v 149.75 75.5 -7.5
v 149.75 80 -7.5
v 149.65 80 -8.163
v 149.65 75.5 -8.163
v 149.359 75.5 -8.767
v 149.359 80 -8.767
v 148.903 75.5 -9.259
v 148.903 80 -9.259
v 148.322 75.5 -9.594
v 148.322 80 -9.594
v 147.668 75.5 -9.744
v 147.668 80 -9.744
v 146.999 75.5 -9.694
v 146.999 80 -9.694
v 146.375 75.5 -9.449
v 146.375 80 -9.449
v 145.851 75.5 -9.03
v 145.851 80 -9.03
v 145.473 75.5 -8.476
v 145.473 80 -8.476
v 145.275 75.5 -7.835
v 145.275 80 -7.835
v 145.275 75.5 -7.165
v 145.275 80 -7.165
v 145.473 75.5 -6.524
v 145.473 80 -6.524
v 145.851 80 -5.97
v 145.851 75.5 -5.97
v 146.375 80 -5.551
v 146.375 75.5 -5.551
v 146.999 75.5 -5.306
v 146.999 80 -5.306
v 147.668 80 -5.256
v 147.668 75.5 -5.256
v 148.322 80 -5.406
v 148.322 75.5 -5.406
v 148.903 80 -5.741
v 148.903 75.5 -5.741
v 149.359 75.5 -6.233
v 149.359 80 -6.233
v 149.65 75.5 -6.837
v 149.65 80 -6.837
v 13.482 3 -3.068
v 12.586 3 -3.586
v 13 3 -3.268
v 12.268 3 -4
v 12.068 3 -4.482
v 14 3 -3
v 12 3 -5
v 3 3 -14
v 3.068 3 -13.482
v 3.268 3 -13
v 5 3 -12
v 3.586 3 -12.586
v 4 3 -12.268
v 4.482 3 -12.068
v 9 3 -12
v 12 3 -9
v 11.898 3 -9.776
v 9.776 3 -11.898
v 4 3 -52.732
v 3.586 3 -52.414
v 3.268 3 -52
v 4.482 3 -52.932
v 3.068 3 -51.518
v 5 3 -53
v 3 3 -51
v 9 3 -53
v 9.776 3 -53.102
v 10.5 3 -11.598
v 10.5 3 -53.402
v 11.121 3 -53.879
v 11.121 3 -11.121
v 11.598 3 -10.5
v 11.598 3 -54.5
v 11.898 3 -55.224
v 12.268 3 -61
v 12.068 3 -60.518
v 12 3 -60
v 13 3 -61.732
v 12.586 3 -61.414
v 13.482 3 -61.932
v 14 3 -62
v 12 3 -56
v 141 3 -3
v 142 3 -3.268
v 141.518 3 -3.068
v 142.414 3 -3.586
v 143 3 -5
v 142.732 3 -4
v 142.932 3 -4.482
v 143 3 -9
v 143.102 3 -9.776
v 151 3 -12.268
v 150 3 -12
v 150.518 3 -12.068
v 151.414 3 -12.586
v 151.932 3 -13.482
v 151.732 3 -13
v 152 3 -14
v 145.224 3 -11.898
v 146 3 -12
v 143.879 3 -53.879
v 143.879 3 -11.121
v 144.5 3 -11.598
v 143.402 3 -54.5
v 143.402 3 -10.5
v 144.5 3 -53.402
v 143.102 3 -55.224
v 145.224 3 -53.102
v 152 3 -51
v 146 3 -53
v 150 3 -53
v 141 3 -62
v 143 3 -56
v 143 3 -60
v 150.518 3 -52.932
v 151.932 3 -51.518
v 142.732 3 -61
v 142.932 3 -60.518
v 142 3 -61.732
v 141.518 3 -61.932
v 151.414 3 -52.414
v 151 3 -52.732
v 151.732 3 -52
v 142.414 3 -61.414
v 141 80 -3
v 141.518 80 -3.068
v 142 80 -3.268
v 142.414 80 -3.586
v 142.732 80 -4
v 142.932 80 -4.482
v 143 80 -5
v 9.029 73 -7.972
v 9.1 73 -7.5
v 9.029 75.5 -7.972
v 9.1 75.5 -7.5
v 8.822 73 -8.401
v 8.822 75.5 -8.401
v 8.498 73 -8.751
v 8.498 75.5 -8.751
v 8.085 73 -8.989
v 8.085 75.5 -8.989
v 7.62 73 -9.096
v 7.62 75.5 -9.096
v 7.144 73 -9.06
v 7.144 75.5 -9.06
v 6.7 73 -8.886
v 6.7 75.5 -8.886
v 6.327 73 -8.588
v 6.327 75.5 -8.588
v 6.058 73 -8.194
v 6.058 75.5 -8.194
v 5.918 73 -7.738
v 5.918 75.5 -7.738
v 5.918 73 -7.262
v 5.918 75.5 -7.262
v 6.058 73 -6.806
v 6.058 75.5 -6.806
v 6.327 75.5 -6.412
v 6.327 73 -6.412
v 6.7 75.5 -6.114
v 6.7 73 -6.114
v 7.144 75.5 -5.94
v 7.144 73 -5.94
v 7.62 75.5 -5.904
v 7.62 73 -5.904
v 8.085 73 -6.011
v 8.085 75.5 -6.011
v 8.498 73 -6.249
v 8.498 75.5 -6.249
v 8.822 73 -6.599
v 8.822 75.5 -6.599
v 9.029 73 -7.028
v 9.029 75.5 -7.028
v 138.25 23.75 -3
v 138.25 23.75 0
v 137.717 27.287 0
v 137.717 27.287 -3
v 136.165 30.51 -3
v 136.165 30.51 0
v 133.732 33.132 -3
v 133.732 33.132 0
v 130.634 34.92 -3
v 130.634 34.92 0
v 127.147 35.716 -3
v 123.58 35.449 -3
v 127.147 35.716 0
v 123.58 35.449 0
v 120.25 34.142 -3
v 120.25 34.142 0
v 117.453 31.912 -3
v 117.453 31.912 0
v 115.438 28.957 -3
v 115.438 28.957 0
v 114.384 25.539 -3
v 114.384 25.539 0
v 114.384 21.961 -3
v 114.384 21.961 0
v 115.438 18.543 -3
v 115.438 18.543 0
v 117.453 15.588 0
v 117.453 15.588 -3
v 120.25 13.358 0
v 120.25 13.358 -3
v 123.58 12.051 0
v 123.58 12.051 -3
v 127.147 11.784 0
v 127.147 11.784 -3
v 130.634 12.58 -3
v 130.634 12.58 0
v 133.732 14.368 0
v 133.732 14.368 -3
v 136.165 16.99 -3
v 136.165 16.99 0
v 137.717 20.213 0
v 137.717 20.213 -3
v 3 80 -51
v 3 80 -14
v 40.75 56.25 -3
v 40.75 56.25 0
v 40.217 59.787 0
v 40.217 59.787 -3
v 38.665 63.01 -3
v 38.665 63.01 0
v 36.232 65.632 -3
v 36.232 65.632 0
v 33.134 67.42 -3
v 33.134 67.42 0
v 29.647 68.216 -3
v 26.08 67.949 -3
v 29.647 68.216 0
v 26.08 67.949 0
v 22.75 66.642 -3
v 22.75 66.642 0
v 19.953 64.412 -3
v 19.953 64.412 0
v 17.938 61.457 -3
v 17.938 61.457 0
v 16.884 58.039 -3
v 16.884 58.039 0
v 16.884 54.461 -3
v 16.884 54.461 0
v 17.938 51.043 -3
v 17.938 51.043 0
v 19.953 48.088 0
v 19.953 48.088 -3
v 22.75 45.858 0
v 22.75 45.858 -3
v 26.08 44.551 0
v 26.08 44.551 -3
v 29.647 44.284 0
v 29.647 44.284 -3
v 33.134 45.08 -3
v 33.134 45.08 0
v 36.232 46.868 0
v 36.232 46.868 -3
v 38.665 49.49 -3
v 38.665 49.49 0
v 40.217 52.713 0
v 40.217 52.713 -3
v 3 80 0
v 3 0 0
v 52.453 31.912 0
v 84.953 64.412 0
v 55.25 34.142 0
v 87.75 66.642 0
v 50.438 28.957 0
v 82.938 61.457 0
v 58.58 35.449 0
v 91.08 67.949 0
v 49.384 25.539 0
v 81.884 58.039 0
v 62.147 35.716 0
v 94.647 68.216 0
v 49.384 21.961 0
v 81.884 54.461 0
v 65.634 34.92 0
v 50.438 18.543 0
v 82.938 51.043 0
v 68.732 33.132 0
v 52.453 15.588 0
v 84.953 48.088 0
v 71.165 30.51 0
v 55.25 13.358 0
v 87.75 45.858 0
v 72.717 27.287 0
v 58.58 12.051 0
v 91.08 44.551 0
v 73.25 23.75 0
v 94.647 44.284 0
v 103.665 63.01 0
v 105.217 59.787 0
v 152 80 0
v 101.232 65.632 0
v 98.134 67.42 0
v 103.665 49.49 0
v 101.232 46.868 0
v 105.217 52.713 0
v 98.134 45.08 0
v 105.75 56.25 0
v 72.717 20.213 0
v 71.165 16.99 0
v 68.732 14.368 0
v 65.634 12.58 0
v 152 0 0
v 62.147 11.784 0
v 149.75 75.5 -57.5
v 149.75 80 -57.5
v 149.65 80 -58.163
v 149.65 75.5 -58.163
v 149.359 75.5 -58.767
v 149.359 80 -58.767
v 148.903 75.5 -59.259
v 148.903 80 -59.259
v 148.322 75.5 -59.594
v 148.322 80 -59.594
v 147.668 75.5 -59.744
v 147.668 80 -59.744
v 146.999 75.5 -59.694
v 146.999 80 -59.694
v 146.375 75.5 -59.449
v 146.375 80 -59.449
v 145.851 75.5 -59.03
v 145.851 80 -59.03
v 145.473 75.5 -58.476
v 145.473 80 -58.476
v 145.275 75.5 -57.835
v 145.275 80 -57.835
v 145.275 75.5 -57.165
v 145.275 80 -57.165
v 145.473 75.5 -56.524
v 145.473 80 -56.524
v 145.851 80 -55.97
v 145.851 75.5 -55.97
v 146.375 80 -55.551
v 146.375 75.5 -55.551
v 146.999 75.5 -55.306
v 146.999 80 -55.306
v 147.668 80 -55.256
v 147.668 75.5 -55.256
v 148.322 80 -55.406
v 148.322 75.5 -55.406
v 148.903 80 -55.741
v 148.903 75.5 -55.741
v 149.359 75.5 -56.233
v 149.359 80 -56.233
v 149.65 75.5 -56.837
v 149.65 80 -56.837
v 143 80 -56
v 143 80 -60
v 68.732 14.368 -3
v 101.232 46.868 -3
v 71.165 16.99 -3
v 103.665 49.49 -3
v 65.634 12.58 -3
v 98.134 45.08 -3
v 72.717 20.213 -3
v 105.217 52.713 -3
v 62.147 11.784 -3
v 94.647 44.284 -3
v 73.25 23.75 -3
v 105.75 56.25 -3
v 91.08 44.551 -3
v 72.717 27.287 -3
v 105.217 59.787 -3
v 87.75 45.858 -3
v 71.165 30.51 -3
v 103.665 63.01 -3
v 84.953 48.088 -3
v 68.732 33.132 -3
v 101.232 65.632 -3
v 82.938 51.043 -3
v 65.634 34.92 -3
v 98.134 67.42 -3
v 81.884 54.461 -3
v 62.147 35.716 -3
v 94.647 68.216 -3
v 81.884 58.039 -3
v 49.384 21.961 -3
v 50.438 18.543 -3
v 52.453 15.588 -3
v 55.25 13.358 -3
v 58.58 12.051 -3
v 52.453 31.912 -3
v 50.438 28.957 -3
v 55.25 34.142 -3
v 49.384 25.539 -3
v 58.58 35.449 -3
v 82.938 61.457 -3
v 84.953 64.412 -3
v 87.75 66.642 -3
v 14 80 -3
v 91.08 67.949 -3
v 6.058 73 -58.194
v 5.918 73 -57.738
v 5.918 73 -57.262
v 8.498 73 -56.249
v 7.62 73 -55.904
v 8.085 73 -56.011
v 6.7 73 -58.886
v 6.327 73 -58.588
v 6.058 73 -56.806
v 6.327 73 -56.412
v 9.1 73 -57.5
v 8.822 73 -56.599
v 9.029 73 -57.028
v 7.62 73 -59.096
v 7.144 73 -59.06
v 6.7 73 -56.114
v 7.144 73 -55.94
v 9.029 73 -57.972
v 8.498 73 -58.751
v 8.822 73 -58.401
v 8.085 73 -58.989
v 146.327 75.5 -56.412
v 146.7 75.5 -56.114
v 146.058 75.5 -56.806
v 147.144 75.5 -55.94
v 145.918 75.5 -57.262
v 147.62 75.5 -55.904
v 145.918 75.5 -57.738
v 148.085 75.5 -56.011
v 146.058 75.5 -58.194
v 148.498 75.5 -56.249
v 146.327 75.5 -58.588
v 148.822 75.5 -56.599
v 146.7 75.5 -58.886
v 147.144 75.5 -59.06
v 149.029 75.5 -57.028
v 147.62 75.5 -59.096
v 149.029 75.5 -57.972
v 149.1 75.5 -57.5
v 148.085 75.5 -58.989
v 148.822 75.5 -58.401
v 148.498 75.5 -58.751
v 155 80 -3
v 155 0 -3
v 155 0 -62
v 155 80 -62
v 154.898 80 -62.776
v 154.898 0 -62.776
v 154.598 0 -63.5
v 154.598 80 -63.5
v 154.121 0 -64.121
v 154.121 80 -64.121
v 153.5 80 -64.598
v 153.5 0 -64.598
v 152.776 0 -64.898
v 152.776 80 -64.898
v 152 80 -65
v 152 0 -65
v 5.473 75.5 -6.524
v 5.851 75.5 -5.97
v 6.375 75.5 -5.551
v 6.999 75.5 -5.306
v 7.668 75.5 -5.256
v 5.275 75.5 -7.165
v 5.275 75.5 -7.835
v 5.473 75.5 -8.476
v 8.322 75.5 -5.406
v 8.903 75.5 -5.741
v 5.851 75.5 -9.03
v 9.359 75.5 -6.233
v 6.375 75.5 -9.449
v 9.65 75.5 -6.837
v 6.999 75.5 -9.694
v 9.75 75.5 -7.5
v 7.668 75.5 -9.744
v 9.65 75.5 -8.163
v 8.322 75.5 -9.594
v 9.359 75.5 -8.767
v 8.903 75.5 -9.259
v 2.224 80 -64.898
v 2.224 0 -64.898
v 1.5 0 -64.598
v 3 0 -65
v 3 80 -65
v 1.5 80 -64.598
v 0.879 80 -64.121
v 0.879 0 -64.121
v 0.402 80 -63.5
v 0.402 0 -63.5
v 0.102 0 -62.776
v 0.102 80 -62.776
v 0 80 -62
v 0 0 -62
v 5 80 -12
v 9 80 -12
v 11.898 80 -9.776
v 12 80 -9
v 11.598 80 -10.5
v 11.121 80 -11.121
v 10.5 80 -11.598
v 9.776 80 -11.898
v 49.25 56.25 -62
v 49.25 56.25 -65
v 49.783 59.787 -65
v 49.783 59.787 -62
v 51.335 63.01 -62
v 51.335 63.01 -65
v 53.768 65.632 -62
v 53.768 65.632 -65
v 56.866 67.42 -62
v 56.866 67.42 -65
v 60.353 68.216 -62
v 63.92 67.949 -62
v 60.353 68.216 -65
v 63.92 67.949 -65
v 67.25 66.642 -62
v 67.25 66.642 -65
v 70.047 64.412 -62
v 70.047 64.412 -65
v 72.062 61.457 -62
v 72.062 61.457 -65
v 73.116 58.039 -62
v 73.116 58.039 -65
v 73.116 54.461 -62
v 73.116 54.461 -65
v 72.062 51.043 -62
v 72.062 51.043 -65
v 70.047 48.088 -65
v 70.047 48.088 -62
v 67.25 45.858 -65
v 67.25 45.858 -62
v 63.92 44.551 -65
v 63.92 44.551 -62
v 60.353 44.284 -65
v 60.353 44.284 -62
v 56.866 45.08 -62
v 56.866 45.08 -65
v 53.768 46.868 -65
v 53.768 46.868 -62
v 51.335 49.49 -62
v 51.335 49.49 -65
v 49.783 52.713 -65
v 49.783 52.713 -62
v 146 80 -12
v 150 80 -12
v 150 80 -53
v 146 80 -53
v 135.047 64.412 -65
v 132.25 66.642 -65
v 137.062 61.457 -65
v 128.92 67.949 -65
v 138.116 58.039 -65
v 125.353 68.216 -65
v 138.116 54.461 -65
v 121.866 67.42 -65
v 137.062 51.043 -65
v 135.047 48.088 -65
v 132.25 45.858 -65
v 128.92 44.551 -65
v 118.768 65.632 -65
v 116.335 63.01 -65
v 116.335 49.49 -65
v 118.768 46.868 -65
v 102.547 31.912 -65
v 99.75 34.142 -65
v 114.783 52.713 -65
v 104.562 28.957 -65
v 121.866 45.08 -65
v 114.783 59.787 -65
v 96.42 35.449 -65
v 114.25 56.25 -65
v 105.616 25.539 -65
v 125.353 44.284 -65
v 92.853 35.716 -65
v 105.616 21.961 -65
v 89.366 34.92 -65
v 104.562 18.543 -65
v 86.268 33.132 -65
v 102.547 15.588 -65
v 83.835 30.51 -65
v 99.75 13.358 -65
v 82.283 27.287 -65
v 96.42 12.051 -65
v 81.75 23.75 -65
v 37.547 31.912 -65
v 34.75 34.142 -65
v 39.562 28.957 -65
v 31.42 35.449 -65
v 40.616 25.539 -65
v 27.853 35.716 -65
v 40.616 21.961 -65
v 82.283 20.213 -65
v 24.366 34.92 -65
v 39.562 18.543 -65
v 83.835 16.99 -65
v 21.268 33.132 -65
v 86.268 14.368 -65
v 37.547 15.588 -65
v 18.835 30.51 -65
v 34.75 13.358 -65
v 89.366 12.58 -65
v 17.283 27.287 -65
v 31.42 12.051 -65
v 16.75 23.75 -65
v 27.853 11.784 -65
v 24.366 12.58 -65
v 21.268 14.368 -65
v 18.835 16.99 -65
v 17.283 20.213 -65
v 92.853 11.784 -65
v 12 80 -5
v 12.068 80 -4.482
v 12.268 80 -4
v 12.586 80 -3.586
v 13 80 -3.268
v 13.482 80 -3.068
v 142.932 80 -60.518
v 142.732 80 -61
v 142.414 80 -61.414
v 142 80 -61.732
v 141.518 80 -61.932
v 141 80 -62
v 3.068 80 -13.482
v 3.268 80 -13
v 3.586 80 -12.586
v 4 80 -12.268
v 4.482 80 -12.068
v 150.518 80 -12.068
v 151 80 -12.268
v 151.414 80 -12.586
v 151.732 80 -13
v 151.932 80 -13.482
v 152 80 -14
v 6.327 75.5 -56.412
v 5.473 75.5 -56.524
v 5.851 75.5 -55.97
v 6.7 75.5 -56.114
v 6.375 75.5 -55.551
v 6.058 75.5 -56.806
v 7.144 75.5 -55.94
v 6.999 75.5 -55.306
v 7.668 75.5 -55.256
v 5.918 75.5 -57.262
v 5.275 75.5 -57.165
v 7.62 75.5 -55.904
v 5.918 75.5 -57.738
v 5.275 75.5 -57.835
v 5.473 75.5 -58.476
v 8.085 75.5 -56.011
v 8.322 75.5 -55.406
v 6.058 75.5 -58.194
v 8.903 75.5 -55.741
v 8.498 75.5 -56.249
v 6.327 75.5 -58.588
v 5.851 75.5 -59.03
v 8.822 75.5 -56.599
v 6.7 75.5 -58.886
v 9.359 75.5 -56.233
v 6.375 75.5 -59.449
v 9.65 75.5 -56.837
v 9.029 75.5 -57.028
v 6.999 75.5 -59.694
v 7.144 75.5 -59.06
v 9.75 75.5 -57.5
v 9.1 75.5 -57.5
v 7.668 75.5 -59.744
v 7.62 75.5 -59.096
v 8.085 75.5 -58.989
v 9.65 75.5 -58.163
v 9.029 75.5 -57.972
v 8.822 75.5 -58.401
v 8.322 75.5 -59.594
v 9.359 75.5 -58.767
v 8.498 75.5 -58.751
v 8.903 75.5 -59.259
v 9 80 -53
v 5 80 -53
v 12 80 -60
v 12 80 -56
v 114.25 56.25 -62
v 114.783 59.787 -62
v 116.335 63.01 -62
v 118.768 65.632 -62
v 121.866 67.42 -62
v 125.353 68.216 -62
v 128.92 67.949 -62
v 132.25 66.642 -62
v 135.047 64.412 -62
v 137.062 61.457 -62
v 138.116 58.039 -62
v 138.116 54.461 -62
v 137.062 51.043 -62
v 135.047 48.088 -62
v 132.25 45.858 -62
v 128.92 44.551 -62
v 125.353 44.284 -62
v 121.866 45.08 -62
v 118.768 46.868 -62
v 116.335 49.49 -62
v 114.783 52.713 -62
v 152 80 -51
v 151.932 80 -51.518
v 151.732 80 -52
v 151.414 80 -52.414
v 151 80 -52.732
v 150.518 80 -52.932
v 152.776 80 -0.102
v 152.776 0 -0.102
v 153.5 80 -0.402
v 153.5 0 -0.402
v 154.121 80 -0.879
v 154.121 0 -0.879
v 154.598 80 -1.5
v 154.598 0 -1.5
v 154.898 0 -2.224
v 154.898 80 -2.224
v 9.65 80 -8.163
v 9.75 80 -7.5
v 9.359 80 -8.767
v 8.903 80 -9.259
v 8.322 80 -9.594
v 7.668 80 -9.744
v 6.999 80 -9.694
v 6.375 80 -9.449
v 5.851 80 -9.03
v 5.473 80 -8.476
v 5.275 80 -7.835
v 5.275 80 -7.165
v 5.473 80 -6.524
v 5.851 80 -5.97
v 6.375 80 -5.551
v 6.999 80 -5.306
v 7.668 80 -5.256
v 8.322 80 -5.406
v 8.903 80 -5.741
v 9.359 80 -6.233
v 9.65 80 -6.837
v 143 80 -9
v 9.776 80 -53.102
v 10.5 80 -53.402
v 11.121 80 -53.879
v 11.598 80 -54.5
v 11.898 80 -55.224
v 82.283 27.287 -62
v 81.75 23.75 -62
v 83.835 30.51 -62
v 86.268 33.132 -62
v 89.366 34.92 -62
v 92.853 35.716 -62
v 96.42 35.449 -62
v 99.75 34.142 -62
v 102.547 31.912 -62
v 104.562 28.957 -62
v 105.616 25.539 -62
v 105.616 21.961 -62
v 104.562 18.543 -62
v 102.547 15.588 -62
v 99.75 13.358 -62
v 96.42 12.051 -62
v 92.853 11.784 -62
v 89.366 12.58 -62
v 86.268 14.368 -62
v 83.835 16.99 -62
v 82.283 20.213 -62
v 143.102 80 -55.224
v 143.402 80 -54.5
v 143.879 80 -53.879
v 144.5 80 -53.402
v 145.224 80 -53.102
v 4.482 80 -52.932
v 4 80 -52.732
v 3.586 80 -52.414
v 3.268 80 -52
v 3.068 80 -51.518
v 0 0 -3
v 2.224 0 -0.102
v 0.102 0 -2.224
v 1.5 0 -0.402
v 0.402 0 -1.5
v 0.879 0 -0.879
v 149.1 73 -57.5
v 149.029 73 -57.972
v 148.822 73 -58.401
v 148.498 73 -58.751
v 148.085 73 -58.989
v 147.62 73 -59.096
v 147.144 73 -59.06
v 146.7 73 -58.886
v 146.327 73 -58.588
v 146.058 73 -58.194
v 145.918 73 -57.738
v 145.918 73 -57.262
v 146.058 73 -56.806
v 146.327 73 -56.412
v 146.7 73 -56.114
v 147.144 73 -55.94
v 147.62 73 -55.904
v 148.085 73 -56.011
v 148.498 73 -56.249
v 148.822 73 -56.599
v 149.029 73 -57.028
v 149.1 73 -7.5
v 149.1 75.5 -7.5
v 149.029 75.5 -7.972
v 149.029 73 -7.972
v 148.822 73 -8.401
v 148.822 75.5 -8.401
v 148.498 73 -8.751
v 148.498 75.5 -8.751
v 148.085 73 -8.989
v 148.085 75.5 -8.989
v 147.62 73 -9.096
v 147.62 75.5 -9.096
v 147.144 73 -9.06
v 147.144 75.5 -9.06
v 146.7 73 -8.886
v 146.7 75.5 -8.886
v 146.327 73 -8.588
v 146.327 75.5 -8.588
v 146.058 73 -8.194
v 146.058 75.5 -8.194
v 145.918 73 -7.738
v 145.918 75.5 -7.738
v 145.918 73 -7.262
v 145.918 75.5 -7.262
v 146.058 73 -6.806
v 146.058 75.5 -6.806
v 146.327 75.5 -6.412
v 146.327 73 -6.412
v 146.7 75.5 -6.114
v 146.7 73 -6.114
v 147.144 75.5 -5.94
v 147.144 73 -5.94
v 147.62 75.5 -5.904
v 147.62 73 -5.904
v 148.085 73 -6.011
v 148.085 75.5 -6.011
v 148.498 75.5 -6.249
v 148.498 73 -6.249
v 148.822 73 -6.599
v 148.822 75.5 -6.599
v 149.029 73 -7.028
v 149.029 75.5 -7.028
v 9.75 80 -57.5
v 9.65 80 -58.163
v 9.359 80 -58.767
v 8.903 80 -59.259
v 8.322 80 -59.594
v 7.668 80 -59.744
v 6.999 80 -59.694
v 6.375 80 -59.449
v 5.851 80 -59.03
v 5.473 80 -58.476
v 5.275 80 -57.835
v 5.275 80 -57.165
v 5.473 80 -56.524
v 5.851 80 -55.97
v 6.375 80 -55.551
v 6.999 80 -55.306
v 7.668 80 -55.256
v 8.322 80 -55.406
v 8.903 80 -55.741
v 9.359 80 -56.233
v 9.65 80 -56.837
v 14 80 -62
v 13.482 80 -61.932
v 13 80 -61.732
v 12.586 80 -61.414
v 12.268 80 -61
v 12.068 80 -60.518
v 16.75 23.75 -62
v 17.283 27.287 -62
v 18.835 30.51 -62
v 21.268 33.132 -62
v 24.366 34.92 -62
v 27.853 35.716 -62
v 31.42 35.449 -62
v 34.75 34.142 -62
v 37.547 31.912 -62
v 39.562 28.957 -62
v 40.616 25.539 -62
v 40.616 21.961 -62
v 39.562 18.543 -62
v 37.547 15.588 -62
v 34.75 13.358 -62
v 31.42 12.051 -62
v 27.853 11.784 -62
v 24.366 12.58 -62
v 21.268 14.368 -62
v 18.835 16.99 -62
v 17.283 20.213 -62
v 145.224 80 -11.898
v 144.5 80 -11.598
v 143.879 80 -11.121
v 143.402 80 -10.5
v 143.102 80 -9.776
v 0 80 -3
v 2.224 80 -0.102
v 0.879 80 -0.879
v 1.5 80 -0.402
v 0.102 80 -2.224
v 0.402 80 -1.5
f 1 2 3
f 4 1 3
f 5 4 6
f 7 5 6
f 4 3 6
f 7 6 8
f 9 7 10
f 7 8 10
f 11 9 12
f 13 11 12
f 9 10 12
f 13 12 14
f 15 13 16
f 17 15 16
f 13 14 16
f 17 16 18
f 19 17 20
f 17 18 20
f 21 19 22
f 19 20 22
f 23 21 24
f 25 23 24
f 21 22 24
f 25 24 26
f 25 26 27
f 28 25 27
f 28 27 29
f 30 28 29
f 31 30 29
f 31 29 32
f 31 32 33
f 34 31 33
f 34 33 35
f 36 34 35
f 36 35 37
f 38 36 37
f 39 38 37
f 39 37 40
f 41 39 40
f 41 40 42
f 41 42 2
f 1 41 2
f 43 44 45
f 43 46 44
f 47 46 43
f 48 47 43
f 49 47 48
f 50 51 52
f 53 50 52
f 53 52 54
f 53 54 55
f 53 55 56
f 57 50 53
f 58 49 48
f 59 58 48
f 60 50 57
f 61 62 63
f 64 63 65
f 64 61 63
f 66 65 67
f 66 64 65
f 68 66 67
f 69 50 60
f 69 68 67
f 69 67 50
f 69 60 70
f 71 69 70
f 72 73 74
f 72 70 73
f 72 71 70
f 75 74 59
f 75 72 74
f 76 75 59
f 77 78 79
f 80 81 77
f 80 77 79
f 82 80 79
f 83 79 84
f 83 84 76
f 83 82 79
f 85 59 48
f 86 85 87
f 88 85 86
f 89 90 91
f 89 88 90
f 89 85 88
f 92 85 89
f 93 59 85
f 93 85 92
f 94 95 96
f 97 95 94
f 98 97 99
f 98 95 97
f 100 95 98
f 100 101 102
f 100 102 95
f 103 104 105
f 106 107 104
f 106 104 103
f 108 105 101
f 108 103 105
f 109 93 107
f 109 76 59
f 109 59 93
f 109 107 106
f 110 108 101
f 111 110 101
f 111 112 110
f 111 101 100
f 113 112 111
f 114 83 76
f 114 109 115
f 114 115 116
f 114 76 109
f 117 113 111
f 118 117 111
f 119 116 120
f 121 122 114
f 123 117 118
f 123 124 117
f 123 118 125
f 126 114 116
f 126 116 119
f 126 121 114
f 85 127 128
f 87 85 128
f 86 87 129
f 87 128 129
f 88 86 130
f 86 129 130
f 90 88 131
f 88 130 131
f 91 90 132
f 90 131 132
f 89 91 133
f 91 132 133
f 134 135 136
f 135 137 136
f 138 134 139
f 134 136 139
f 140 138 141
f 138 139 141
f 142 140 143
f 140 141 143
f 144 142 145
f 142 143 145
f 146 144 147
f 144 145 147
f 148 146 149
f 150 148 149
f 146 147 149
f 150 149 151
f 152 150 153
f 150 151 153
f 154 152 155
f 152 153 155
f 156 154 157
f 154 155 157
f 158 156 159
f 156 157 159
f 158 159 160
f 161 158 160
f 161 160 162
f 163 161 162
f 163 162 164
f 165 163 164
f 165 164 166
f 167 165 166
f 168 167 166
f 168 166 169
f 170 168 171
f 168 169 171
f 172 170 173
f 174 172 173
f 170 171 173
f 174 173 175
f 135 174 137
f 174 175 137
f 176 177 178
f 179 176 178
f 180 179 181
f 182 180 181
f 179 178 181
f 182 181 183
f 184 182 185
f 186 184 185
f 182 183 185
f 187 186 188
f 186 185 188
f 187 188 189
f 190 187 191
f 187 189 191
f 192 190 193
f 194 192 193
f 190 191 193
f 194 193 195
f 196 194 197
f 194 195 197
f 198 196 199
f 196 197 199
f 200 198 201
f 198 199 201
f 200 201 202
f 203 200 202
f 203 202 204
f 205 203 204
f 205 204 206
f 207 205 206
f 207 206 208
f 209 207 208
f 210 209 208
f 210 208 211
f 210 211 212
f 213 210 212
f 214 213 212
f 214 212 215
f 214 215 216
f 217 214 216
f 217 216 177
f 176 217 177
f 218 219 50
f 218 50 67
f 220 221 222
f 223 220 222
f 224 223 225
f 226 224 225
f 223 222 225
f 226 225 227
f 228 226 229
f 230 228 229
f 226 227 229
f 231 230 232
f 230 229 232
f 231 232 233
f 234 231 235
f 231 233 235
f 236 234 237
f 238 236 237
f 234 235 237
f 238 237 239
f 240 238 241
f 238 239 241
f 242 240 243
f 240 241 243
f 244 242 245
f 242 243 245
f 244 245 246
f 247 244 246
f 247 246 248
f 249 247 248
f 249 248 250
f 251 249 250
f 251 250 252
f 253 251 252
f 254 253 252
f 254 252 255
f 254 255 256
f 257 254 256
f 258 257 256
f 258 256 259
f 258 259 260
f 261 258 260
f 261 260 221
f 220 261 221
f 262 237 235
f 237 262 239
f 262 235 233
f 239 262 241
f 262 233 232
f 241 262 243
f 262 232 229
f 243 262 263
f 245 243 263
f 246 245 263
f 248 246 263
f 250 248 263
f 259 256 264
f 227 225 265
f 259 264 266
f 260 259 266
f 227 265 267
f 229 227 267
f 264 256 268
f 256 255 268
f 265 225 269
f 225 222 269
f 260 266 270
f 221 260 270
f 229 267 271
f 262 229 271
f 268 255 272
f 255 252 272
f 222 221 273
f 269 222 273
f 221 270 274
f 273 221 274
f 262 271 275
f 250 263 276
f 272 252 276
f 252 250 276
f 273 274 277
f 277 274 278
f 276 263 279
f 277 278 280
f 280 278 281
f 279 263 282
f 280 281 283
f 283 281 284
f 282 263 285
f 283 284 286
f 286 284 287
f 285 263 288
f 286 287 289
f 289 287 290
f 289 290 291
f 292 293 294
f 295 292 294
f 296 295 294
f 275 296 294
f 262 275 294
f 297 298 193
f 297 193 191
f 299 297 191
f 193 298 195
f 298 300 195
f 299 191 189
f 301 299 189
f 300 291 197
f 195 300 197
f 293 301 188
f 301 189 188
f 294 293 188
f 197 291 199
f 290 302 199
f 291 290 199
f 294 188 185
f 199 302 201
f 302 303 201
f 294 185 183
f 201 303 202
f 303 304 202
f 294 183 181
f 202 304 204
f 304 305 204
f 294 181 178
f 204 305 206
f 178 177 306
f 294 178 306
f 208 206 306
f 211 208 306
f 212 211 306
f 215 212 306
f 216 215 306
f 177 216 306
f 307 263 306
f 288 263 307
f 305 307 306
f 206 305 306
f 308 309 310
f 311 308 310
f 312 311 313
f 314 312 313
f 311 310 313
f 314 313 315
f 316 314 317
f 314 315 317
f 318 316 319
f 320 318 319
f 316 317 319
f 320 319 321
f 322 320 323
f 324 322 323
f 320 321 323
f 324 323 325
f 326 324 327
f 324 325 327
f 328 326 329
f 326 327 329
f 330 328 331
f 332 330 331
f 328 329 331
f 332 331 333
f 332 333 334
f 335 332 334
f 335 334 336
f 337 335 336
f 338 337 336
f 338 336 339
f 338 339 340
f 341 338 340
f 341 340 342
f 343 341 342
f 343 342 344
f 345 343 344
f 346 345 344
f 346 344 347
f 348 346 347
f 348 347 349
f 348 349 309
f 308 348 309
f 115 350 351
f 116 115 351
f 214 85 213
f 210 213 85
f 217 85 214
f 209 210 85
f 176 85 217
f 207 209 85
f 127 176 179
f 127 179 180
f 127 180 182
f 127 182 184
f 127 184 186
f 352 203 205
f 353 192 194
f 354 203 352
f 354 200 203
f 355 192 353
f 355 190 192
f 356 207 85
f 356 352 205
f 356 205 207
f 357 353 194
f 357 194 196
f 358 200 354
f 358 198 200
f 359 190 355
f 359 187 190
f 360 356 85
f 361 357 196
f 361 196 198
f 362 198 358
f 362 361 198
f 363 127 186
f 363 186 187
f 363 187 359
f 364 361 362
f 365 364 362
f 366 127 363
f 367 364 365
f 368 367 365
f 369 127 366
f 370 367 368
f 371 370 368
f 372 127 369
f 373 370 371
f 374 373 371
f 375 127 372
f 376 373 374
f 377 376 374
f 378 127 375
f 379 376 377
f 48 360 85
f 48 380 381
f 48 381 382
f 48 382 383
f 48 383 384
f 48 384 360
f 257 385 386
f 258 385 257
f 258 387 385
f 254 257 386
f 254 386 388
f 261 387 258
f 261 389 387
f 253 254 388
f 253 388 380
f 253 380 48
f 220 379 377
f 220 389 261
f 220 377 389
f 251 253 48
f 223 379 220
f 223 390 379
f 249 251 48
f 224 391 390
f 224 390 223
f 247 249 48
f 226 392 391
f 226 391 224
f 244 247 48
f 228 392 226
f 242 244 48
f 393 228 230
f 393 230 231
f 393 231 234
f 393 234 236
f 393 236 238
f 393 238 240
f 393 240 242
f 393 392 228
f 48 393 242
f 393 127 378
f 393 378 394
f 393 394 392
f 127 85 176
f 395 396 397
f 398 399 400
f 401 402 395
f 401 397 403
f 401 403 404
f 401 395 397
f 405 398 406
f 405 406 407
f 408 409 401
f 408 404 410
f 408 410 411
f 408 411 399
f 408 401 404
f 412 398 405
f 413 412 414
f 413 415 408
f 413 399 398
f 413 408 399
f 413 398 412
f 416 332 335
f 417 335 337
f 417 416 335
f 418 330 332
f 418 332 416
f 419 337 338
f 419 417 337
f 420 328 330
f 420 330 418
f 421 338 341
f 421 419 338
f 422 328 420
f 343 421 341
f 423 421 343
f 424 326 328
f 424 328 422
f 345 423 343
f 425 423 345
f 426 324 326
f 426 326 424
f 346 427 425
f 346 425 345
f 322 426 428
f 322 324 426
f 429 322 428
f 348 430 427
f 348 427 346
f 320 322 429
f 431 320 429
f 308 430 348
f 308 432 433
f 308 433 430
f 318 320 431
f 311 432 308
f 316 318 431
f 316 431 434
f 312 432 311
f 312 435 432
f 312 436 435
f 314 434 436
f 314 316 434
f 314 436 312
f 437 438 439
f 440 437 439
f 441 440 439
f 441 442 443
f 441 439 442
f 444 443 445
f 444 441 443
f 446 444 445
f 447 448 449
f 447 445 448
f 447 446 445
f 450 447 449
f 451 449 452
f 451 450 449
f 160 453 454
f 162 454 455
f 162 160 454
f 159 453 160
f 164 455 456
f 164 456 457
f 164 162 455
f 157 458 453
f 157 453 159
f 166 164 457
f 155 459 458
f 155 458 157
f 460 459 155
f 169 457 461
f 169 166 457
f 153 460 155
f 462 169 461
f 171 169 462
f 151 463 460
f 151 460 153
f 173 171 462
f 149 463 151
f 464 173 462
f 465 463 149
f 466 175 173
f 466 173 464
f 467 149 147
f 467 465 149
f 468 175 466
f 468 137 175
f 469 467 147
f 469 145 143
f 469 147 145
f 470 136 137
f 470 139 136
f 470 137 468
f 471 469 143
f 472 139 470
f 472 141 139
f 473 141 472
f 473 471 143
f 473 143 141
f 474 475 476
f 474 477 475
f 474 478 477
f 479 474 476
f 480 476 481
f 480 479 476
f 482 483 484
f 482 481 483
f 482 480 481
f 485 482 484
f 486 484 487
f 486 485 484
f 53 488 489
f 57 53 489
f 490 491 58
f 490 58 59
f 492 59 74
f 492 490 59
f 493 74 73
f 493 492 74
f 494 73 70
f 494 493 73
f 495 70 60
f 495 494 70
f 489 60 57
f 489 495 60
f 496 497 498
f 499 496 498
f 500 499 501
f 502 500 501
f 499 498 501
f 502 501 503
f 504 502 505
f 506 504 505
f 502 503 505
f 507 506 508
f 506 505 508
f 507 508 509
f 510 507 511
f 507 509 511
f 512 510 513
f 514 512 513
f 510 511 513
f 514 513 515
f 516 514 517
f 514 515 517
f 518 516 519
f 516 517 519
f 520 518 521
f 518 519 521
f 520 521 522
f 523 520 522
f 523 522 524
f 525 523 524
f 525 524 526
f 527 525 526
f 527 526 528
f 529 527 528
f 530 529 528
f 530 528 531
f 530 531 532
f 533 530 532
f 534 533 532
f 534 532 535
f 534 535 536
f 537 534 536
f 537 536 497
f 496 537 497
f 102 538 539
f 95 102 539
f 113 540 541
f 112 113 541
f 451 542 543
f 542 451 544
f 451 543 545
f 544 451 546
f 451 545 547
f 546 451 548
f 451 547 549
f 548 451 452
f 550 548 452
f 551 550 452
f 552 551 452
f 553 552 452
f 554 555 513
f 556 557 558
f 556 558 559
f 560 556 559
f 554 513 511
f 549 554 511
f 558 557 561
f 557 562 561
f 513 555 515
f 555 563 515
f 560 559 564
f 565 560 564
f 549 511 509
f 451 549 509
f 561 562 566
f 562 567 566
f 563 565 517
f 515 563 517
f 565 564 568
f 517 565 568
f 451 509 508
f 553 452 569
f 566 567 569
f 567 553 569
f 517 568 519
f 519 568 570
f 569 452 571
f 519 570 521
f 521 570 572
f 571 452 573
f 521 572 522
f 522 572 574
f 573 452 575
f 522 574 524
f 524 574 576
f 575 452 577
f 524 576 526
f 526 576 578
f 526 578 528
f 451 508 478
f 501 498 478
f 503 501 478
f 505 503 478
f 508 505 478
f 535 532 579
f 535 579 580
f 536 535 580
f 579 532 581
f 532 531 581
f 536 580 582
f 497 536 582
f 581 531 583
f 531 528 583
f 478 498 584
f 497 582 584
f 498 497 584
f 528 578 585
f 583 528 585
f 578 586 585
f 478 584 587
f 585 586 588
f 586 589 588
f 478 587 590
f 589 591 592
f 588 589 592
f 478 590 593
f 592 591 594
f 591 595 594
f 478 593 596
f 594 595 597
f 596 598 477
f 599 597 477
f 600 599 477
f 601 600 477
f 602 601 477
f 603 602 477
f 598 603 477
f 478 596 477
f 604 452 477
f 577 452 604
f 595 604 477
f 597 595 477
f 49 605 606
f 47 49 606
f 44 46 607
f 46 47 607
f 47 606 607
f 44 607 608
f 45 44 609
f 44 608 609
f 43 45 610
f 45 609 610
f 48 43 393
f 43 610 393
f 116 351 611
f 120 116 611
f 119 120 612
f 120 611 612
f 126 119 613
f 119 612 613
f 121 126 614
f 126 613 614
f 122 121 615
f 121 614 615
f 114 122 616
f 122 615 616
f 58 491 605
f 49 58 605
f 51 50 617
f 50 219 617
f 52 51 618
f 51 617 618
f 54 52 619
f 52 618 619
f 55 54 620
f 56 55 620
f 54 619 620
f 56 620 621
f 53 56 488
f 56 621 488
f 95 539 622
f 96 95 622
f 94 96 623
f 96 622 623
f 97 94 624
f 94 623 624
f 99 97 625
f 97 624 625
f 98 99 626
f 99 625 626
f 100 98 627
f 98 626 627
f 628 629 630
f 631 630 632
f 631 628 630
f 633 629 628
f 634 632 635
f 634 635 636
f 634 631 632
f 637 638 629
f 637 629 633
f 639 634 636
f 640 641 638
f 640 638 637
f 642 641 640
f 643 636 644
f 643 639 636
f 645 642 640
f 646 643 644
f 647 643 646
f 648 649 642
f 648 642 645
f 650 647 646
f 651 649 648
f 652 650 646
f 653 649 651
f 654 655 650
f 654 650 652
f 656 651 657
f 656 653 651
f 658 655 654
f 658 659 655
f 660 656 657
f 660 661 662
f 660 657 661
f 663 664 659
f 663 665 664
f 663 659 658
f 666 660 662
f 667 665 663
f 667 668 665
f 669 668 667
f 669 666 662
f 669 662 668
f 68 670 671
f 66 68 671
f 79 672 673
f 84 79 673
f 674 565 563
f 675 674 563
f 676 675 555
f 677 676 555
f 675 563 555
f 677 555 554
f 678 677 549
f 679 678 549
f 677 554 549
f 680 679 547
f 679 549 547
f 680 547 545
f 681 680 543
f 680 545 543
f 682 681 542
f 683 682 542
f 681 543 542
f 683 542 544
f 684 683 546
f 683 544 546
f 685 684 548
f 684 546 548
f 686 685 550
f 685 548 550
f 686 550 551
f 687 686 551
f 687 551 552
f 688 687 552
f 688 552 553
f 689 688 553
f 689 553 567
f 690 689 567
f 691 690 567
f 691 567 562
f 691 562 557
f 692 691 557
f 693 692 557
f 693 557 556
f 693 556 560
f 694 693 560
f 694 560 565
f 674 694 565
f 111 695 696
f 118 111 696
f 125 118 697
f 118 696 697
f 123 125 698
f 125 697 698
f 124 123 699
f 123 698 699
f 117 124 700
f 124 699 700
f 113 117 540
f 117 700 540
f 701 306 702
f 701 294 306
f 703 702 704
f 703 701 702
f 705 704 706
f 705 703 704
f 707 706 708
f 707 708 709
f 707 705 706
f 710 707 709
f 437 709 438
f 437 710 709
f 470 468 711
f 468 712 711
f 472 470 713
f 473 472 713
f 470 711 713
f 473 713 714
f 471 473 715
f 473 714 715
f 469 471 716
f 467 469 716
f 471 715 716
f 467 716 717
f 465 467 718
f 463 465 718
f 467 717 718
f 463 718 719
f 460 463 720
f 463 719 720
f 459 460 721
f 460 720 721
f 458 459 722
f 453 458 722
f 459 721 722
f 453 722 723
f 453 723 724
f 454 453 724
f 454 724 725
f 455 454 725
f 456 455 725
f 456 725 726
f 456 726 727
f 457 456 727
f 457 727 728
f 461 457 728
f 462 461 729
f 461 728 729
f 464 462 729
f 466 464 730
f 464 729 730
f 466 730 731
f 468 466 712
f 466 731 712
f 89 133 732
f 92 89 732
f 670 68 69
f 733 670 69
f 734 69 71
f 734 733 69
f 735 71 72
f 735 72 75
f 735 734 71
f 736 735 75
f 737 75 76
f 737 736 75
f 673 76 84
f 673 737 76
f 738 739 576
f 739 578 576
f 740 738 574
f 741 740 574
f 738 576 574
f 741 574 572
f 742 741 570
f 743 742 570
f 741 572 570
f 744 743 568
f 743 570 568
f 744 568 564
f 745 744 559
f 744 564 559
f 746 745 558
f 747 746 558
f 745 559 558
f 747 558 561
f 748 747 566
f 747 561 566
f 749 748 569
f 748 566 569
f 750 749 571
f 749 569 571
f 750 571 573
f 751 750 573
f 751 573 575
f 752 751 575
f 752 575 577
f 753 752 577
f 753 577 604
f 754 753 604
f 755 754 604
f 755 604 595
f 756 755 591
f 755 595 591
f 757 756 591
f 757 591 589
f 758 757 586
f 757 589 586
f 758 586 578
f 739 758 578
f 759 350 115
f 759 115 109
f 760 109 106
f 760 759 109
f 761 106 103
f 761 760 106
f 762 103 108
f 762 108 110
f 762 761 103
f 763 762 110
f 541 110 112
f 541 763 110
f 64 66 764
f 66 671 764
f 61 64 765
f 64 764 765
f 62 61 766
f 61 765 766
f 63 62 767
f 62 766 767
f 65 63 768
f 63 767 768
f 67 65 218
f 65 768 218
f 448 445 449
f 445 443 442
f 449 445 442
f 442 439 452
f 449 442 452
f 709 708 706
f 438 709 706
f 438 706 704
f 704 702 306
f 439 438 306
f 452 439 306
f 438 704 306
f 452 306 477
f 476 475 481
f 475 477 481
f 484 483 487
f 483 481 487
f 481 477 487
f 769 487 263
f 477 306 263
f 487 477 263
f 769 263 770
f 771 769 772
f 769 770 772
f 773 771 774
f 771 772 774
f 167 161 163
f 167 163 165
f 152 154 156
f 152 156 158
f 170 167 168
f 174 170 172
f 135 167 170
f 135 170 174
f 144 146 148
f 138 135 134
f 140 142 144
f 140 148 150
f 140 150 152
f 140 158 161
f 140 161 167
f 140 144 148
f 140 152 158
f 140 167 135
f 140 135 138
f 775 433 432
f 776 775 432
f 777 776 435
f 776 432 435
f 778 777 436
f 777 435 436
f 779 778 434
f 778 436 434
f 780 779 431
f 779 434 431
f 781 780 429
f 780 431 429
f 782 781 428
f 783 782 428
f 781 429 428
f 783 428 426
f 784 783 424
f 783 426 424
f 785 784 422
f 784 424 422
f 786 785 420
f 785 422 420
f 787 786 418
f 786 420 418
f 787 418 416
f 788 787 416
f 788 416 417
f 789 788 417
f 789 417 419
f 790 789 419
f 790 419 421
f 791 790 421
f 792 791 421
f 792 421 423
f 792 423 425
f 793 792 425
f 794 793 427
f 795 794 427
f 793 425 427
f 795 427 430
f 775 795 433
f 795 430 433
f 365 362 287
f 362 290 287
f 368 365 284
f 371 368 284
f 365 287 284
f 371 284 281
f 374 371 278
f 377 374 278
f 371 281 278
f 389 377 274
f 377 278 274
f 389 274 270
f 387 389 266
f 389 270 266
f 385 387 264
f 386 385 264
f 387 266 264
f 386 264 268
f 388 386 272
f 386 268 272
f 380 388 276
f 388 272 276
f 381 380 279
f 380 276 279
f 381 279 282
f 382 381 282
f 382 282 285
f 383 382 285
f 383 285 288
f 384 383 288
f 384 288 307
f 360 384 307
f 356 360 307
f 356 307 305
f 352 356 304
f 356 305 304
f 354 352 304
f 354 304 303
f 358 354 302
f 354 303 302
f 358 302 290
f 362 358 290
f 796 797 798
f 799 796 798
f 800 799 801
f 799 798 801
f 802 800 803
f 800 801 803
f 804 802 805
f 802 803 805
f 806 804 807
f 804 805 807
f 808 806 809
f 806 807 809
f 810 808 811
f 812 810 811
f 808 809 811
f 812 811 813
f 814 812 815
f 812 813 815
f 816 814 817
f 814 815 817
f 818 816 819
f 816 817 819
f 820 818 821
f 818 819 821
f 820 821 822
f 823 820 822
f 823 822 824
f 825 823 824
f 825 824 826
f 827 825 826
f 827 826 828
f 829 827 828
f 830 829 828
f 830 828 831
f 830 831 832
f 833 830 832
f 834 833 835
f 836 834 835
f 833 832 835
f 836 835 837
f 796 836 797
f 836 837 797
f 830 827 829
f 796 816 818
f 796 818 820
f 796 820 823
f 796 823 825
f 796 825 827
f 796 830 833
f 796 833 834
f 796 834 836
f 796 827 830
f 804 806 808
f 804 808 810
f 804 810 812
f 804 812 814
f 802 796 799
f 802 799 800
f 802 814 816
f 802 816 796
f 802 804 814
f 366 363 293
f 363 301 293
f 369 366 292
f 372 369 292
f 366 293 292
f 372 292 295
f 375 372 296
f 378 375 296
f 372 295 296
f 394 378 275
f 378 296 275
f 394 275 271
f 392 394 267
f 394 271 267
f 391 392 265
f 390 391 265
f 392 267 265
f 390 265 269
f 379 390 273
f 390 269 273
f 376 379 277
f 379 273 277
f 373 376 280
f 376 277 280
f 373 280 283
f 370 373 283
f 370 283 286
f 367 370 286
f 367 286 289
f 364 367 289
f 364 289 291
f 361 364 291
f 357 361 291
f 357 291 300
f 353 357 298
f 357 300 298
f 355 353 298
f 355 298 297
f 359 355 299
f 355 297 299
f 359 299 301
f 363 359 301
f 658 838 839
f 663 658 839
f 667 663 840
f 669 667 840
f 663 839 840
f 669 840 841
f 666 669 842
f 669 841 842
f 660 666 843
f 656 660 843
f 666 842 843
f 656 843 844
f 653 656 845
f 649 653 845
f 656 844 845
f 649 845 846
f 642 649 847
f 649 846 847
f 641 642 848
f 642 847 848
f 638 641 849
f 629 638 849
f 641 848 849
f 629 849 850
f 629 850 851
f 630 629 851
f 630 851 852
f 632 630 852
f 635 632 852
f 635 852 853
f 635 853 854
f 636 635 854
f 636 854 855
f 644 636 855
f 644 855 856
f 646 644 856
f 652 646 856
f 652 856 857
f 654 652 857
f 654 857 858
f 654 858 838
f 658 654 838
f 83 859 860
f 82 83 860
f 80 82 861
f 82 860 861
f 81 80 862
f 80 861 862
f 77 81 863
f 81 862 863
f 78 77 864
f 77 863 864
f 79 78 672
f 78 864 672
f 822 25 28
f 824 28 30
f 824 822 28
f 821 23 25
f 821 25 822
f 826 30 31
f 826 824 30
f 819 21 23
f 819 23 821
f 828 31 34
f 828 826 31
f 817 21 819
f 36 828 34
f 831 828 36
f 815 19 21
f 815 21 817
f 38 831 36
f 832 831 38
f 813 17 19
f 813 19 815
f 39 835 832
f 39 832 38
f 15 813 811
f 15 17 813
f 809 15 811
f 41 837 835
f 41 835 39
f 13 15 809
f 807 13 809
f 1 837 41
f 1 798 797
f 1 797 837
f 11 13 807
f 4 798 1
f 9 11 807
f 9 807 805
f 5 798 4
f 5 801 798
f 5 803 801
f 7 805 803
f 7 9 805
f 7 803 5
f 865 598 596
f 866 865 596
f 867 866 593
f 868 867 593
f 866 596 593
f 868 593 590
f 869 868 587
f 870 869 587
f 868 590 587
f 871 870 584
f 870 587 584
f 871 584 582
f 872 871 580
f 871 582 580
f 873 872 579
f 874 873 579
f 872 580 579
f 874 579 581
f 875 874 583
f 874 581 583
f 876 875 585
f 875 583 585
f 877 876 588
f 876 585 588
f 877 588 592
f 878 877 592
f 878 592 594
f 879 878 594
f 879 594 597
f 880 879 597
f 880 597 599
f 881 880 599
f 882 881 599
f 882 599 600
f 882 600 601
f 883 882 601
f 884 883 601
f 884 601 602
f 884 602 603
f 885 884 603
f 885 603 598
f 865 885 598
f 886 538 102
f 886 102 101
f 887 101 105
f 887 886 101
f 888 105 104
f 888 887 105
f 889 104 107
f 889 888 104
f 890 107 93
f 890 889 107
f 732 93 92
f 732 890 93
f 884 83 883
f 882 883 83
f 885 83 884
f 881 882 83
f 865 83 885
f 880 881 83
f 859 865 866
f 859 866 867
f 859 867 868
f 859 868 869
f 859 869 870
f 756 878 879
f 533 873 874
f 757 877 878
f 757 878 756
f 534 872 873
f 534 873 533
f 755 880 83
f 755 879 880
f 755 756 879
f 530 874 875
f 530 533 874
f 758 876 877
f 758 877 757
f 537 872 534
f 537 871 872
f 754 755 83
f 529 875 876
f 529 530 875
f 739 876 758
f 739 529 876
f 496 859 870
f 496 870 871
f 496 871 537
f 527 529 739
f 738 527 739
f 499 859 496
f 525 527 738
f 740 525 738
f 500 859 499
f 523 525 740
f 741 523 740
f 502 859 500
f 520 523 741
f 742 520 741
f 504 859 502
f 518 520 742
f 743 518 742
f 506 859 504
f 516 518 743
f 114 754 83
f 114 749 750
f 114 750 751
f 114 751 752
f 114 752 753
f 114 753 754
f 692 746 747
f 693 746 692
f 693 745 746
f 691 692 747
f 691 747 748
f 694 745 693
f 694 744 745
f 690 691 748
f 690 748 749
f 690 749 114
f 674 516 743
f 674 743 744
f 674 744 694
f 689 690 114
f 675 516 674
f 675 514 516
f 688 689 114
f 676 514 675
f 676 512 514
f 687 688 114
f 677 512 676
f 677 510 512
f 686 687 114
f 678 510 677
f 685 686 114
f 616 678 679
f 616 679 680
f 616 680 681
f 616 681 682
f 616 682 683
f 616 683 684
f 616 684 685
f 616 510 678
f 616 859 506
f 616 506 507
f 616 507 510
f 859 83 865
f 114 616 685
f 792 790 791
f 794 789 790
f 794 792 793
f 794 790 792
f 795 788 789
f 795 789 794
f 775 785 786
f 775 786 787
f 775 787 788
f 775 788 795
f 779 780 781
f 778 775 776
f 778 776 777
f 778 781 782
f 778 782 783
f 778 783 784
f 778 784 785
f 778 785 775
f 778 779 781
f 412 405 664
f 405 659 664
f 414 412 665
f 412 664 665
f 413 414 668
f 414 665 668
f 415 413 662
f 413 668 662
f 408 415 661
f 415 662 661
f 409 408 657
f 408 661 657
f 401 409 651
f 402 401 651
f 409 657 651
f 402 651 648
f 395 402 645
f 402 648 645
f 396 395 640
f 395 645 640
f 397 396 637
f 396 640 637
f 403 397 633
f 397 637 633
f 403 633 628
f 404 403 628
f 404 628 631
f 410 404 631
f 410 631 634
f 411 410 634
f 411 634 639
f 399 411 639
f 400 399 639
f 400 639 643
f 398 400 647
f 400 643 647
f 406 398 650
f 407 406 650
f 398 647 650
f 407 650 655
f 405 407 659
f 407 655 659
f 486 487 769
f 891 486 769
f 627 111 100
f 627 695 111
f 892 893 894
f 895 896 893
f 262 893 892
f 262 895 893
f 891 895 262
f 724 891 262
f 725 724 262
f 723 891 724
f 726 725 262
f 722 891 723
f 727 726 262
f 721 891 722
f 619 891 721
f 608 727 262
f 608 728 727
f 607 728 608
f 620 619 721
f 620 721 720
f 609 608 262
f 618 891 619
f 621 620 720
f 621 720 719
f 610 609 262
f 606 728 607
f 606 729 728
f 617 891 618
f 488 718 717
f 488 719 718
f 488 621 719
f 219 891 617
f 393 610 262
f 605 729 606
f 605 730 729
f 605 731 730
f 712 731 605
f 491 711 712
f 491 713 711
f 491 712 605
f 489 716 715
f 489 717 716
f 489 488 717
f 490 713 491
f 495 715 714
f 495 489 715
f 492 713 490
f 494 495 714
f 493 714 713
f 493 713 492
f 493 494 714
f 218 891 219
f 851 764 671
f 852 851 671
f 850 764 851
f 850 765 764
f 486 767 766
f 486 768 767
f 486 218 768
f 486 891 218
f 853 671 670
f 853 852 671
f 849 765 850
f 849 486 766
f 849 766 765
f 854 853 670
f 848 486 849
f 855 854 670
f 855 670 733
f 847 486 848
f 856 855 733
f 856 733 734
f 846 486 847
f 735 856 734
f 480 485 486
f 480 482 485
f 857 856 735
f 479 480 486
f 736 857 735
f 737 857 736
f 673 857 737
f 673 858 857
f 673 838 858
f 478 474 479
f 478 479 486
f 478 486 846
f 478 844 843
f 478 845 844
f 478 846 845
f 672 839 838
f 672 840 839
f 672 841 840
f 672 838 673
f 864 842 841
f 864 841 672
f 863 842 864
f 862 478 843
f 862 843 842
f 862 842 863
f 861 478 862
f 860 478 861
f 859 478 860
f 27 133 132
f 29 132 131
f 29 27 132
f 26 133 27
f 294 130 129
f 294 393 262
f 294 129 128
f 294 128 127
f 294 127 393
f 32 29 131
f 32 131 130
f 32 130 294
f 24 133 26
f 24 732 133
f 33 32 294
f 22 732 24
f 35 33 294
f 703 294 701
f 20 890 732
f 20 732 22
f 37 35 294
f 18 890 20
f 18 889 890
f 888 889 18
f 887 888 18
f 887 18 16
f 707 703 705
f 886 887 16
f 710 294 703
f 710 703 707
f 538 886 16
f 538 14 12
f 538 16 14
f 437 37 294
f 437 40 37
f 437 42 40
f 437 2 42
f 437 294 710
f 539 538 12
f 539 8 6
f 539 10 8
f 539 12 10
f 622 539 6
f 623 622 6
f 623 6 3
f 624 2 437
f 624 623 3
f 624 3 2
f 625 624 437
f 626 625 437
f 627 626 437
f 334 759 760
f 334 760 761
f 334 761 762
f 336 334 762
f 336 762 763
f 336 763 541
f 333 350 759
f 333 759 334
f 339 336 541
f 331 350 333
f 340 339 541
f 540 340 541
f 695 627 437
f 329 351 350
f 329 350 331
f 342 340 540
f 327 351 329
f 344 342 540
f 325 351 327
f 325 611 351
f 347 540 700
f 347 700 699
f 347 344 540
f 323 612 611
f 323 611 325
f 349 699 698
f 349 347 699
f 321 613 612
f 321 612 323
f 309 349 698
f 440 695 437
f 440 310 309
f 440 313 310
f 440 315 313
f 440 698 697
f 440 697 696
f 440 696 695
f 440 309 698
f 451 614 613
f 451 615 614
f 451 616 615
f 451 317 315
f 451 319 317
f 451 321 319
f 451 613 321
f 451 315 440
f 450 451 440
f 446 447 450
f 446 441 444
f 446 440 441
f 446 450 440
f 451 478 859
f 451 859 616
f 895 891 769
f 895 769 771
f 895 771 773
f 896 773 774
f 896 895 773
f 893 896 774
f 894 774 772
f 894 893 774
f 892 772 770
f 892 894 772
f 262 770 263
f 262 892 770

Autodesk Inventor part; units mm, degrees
ref_plane "YZ Plane" through (0, 0, 0) normal (1, 0, 0) x (0, 1, 0)
ref_plane "XZ Plane" through (0, 0, 0) normal (0, 1, 0) x (-1, 0, 0)
ref_plane "XY Plane" through (0, 0, 0) normal (0, 0, 1) x (1, 0, 0)
sketch "Sketch1" plane through (0, 0, 0) normal (0, 1, 0) x (-1, 0, 0)
  line L0 (0, 0) -> (-155, 0)
  line L1 (-155, 0) -> (-155, -65)
  line L2 (-155, -65) -> (0, -65)
  line L3 (0, -65) -> (0, 0)
  dimension "d0" = 155
  dimension "d1" = 65
extrude "Extrusion1" add sketch "Sketch1" along normal blind 80
sketch "Sketch2" plane through (0, 80, 0) normal (0, 1, 0) x (1, 0, 0)
  line L0 (155, 0) -> (155, 65) projected
  line L1 (155, 65) -> (0, 65) projected
  line L2 (0, 65) -> (0, 0) projected
  line L3 (0, 0) -> (155, 0) projected
  line L4 (3, 62) -> (152, 62)
  line L5 (152, 62) -> (152, 3)
  line L6 (152, 3) -> (3, 3)
  line L7 (3, 3) -> (3, 62)
  dimension "d4" = 3
extrude "Extrusion2" cut sketch "Sketch2" against normal blind 77 contours L4 L5 L6 L7
sketch "Sketch3" plane through (0, 0, 0) normal (0, 0, 1) x (1, 0, 0)
  circle A0 centre (28.75, 56.25) radius 12
  circle A1 centre (61.25, 23.75) radius 12
  circle A2 centre (93.75, 56.25) radius 12
  circle A3 centre (126.25, 23.75) radius 12
  point P0 (0, 0)
  dimension "d7" = 24
  dimension "d8" = 24
  dimension "d9" = 24
  dimension "d10" = 24
extrude "Extrusion3" cut sketch "Sketch3" against normal blind 3
sketch "Sketch4" plane through (155, 0, -65) normal (0, 0, -1) x (-1, 0, 0)
  circle A0 centre (28.75, 56.25) radius 12
  circle A1 centre (61.25, 23.75) radius 12
  circle A2 centre (93.75, 56.25) radius 12
  circle A3 centre (126.25, 23.75) radius 12
  point P0 (155, 0)
  dimension "d13" = 24
  dimension "d14" = 24
  dimension "d15" = 24
  dimension "d16" = 24
extrude "Extrusion4" cut sketch "Sketch4" against normal blind 3
sketch "Sketch5" plane through (0, 3, 0) normal (0, 1, 0) x (1, 0, 0)
  line L0 (152, 3) -> (3, 3) projected
  line L1 (152, 62) -> (152, 3) projected
  line L2 (3, 62) -> (152, 62) projected
  line L3 (3, 3) -> (3, 62) projected
  line L4 (3, 62) -> (12, 62)
  line L5 (12, 62) -> (12, 53)
  line L6 (12, 53) -> (3, 53)
  line L7 (3, 53) -> (3, 62)
  point P0 (0, 0)
  point P1 (3, 57.5)
  point P2 (3, 53)
  dimension "d19" = 9
  dimension "d20" = 9
  dimension "d21" = 0
  dimension "d22" = 0
extrude "Extrusion5" add sketch "Sketch5" along normal blind 77 contours L3 L2 L5 L6
fillet "Fillet1" radius 3 4 edges at (0, 40, 0) (0, 40, -65) (155, 40, -65) (155, 40, 0)
sketch "Sketch8" plane through (0, 80, 0) normal (0, 1, 0) x (1, 0, 0)
  circle A0 centre (7.5, 57.5) radius 2.25
  arc A1 (152, 0) -> (155, 3) centre (152, 3) ccw projected
  line L0 (155, 3) -> (155, 62) projected
  arc A2 (155, 62) -> (152, 65) centre (152, 62) ccw projected
  line L1 (152, 65) -> (3, 65) projected
  arc A3 (3, 65) -> (0, 62) centre (3, 62) ccw projected
  line L2 (0, 62) -> (0, 3) projected
  arc A4 (0, 3) -> (3, 0) centre (3, 3) ccw projected
  line L3 (3, 0) -> (152, 0) projected
  line L4 (3, 3) -> (3, 53) projected
  line L5 (3, 53) -> (12, 53) projected
  line L6 (12, 53) -> (12, 62) projected
  line L7 (12, 62) -> (152, 62) projected
  line L8 (152, 62) -> (152, 3) projected
  line L9 (152, 3) -> (3, 3) projected
  point P0 (0, 0)
  dimension "d45" = 4.5
  dimension "d46" = 4.5
  dimension "d47" = 4.5
extrude "Extrusion8" cut sketch "Sketch8" against normal blind 4.5 contours A0
sketch "Sketch9" plane through (7.5, 75.5, -57.5) normal (0, 1, 0) x (1, 0, 0)
  circle A0 centre (0, 0) radius 2.25 projected
  circle A1 centre (0, 0) radius 1.6
  point P0 (-7.5, -57.5)
  dimension "d50" = 3.2
extrude "Extrusion9" cut sketch "Sketch9" against normal blind 2.5 contours A1
pattern_linear "Rectangular Pattern2" count 2 spacing 140 along (1, 0, 0) count 2 spacing -50 along (0, 0, -1) of "Extrusion5", "Extrusion8", "Extrusion9"
fillet "Fillet4" radius 3 4 edges at (12, 41.5, -53) (12, 41.5, -12) (143, 41.5, -53) (143, 41.5, -12)
fillet "Fillet5" radius 2 8 edges at (3, 41.5, -53) (12, 41.5, -62) (3, 41.5, -12) (12, 41.5, -3) (152, 41.5, -53) (143, 41.5, -62) (152, 41.5, -12) (143, 41.5, -3)
properties part number "arcade_box_iteration3"
